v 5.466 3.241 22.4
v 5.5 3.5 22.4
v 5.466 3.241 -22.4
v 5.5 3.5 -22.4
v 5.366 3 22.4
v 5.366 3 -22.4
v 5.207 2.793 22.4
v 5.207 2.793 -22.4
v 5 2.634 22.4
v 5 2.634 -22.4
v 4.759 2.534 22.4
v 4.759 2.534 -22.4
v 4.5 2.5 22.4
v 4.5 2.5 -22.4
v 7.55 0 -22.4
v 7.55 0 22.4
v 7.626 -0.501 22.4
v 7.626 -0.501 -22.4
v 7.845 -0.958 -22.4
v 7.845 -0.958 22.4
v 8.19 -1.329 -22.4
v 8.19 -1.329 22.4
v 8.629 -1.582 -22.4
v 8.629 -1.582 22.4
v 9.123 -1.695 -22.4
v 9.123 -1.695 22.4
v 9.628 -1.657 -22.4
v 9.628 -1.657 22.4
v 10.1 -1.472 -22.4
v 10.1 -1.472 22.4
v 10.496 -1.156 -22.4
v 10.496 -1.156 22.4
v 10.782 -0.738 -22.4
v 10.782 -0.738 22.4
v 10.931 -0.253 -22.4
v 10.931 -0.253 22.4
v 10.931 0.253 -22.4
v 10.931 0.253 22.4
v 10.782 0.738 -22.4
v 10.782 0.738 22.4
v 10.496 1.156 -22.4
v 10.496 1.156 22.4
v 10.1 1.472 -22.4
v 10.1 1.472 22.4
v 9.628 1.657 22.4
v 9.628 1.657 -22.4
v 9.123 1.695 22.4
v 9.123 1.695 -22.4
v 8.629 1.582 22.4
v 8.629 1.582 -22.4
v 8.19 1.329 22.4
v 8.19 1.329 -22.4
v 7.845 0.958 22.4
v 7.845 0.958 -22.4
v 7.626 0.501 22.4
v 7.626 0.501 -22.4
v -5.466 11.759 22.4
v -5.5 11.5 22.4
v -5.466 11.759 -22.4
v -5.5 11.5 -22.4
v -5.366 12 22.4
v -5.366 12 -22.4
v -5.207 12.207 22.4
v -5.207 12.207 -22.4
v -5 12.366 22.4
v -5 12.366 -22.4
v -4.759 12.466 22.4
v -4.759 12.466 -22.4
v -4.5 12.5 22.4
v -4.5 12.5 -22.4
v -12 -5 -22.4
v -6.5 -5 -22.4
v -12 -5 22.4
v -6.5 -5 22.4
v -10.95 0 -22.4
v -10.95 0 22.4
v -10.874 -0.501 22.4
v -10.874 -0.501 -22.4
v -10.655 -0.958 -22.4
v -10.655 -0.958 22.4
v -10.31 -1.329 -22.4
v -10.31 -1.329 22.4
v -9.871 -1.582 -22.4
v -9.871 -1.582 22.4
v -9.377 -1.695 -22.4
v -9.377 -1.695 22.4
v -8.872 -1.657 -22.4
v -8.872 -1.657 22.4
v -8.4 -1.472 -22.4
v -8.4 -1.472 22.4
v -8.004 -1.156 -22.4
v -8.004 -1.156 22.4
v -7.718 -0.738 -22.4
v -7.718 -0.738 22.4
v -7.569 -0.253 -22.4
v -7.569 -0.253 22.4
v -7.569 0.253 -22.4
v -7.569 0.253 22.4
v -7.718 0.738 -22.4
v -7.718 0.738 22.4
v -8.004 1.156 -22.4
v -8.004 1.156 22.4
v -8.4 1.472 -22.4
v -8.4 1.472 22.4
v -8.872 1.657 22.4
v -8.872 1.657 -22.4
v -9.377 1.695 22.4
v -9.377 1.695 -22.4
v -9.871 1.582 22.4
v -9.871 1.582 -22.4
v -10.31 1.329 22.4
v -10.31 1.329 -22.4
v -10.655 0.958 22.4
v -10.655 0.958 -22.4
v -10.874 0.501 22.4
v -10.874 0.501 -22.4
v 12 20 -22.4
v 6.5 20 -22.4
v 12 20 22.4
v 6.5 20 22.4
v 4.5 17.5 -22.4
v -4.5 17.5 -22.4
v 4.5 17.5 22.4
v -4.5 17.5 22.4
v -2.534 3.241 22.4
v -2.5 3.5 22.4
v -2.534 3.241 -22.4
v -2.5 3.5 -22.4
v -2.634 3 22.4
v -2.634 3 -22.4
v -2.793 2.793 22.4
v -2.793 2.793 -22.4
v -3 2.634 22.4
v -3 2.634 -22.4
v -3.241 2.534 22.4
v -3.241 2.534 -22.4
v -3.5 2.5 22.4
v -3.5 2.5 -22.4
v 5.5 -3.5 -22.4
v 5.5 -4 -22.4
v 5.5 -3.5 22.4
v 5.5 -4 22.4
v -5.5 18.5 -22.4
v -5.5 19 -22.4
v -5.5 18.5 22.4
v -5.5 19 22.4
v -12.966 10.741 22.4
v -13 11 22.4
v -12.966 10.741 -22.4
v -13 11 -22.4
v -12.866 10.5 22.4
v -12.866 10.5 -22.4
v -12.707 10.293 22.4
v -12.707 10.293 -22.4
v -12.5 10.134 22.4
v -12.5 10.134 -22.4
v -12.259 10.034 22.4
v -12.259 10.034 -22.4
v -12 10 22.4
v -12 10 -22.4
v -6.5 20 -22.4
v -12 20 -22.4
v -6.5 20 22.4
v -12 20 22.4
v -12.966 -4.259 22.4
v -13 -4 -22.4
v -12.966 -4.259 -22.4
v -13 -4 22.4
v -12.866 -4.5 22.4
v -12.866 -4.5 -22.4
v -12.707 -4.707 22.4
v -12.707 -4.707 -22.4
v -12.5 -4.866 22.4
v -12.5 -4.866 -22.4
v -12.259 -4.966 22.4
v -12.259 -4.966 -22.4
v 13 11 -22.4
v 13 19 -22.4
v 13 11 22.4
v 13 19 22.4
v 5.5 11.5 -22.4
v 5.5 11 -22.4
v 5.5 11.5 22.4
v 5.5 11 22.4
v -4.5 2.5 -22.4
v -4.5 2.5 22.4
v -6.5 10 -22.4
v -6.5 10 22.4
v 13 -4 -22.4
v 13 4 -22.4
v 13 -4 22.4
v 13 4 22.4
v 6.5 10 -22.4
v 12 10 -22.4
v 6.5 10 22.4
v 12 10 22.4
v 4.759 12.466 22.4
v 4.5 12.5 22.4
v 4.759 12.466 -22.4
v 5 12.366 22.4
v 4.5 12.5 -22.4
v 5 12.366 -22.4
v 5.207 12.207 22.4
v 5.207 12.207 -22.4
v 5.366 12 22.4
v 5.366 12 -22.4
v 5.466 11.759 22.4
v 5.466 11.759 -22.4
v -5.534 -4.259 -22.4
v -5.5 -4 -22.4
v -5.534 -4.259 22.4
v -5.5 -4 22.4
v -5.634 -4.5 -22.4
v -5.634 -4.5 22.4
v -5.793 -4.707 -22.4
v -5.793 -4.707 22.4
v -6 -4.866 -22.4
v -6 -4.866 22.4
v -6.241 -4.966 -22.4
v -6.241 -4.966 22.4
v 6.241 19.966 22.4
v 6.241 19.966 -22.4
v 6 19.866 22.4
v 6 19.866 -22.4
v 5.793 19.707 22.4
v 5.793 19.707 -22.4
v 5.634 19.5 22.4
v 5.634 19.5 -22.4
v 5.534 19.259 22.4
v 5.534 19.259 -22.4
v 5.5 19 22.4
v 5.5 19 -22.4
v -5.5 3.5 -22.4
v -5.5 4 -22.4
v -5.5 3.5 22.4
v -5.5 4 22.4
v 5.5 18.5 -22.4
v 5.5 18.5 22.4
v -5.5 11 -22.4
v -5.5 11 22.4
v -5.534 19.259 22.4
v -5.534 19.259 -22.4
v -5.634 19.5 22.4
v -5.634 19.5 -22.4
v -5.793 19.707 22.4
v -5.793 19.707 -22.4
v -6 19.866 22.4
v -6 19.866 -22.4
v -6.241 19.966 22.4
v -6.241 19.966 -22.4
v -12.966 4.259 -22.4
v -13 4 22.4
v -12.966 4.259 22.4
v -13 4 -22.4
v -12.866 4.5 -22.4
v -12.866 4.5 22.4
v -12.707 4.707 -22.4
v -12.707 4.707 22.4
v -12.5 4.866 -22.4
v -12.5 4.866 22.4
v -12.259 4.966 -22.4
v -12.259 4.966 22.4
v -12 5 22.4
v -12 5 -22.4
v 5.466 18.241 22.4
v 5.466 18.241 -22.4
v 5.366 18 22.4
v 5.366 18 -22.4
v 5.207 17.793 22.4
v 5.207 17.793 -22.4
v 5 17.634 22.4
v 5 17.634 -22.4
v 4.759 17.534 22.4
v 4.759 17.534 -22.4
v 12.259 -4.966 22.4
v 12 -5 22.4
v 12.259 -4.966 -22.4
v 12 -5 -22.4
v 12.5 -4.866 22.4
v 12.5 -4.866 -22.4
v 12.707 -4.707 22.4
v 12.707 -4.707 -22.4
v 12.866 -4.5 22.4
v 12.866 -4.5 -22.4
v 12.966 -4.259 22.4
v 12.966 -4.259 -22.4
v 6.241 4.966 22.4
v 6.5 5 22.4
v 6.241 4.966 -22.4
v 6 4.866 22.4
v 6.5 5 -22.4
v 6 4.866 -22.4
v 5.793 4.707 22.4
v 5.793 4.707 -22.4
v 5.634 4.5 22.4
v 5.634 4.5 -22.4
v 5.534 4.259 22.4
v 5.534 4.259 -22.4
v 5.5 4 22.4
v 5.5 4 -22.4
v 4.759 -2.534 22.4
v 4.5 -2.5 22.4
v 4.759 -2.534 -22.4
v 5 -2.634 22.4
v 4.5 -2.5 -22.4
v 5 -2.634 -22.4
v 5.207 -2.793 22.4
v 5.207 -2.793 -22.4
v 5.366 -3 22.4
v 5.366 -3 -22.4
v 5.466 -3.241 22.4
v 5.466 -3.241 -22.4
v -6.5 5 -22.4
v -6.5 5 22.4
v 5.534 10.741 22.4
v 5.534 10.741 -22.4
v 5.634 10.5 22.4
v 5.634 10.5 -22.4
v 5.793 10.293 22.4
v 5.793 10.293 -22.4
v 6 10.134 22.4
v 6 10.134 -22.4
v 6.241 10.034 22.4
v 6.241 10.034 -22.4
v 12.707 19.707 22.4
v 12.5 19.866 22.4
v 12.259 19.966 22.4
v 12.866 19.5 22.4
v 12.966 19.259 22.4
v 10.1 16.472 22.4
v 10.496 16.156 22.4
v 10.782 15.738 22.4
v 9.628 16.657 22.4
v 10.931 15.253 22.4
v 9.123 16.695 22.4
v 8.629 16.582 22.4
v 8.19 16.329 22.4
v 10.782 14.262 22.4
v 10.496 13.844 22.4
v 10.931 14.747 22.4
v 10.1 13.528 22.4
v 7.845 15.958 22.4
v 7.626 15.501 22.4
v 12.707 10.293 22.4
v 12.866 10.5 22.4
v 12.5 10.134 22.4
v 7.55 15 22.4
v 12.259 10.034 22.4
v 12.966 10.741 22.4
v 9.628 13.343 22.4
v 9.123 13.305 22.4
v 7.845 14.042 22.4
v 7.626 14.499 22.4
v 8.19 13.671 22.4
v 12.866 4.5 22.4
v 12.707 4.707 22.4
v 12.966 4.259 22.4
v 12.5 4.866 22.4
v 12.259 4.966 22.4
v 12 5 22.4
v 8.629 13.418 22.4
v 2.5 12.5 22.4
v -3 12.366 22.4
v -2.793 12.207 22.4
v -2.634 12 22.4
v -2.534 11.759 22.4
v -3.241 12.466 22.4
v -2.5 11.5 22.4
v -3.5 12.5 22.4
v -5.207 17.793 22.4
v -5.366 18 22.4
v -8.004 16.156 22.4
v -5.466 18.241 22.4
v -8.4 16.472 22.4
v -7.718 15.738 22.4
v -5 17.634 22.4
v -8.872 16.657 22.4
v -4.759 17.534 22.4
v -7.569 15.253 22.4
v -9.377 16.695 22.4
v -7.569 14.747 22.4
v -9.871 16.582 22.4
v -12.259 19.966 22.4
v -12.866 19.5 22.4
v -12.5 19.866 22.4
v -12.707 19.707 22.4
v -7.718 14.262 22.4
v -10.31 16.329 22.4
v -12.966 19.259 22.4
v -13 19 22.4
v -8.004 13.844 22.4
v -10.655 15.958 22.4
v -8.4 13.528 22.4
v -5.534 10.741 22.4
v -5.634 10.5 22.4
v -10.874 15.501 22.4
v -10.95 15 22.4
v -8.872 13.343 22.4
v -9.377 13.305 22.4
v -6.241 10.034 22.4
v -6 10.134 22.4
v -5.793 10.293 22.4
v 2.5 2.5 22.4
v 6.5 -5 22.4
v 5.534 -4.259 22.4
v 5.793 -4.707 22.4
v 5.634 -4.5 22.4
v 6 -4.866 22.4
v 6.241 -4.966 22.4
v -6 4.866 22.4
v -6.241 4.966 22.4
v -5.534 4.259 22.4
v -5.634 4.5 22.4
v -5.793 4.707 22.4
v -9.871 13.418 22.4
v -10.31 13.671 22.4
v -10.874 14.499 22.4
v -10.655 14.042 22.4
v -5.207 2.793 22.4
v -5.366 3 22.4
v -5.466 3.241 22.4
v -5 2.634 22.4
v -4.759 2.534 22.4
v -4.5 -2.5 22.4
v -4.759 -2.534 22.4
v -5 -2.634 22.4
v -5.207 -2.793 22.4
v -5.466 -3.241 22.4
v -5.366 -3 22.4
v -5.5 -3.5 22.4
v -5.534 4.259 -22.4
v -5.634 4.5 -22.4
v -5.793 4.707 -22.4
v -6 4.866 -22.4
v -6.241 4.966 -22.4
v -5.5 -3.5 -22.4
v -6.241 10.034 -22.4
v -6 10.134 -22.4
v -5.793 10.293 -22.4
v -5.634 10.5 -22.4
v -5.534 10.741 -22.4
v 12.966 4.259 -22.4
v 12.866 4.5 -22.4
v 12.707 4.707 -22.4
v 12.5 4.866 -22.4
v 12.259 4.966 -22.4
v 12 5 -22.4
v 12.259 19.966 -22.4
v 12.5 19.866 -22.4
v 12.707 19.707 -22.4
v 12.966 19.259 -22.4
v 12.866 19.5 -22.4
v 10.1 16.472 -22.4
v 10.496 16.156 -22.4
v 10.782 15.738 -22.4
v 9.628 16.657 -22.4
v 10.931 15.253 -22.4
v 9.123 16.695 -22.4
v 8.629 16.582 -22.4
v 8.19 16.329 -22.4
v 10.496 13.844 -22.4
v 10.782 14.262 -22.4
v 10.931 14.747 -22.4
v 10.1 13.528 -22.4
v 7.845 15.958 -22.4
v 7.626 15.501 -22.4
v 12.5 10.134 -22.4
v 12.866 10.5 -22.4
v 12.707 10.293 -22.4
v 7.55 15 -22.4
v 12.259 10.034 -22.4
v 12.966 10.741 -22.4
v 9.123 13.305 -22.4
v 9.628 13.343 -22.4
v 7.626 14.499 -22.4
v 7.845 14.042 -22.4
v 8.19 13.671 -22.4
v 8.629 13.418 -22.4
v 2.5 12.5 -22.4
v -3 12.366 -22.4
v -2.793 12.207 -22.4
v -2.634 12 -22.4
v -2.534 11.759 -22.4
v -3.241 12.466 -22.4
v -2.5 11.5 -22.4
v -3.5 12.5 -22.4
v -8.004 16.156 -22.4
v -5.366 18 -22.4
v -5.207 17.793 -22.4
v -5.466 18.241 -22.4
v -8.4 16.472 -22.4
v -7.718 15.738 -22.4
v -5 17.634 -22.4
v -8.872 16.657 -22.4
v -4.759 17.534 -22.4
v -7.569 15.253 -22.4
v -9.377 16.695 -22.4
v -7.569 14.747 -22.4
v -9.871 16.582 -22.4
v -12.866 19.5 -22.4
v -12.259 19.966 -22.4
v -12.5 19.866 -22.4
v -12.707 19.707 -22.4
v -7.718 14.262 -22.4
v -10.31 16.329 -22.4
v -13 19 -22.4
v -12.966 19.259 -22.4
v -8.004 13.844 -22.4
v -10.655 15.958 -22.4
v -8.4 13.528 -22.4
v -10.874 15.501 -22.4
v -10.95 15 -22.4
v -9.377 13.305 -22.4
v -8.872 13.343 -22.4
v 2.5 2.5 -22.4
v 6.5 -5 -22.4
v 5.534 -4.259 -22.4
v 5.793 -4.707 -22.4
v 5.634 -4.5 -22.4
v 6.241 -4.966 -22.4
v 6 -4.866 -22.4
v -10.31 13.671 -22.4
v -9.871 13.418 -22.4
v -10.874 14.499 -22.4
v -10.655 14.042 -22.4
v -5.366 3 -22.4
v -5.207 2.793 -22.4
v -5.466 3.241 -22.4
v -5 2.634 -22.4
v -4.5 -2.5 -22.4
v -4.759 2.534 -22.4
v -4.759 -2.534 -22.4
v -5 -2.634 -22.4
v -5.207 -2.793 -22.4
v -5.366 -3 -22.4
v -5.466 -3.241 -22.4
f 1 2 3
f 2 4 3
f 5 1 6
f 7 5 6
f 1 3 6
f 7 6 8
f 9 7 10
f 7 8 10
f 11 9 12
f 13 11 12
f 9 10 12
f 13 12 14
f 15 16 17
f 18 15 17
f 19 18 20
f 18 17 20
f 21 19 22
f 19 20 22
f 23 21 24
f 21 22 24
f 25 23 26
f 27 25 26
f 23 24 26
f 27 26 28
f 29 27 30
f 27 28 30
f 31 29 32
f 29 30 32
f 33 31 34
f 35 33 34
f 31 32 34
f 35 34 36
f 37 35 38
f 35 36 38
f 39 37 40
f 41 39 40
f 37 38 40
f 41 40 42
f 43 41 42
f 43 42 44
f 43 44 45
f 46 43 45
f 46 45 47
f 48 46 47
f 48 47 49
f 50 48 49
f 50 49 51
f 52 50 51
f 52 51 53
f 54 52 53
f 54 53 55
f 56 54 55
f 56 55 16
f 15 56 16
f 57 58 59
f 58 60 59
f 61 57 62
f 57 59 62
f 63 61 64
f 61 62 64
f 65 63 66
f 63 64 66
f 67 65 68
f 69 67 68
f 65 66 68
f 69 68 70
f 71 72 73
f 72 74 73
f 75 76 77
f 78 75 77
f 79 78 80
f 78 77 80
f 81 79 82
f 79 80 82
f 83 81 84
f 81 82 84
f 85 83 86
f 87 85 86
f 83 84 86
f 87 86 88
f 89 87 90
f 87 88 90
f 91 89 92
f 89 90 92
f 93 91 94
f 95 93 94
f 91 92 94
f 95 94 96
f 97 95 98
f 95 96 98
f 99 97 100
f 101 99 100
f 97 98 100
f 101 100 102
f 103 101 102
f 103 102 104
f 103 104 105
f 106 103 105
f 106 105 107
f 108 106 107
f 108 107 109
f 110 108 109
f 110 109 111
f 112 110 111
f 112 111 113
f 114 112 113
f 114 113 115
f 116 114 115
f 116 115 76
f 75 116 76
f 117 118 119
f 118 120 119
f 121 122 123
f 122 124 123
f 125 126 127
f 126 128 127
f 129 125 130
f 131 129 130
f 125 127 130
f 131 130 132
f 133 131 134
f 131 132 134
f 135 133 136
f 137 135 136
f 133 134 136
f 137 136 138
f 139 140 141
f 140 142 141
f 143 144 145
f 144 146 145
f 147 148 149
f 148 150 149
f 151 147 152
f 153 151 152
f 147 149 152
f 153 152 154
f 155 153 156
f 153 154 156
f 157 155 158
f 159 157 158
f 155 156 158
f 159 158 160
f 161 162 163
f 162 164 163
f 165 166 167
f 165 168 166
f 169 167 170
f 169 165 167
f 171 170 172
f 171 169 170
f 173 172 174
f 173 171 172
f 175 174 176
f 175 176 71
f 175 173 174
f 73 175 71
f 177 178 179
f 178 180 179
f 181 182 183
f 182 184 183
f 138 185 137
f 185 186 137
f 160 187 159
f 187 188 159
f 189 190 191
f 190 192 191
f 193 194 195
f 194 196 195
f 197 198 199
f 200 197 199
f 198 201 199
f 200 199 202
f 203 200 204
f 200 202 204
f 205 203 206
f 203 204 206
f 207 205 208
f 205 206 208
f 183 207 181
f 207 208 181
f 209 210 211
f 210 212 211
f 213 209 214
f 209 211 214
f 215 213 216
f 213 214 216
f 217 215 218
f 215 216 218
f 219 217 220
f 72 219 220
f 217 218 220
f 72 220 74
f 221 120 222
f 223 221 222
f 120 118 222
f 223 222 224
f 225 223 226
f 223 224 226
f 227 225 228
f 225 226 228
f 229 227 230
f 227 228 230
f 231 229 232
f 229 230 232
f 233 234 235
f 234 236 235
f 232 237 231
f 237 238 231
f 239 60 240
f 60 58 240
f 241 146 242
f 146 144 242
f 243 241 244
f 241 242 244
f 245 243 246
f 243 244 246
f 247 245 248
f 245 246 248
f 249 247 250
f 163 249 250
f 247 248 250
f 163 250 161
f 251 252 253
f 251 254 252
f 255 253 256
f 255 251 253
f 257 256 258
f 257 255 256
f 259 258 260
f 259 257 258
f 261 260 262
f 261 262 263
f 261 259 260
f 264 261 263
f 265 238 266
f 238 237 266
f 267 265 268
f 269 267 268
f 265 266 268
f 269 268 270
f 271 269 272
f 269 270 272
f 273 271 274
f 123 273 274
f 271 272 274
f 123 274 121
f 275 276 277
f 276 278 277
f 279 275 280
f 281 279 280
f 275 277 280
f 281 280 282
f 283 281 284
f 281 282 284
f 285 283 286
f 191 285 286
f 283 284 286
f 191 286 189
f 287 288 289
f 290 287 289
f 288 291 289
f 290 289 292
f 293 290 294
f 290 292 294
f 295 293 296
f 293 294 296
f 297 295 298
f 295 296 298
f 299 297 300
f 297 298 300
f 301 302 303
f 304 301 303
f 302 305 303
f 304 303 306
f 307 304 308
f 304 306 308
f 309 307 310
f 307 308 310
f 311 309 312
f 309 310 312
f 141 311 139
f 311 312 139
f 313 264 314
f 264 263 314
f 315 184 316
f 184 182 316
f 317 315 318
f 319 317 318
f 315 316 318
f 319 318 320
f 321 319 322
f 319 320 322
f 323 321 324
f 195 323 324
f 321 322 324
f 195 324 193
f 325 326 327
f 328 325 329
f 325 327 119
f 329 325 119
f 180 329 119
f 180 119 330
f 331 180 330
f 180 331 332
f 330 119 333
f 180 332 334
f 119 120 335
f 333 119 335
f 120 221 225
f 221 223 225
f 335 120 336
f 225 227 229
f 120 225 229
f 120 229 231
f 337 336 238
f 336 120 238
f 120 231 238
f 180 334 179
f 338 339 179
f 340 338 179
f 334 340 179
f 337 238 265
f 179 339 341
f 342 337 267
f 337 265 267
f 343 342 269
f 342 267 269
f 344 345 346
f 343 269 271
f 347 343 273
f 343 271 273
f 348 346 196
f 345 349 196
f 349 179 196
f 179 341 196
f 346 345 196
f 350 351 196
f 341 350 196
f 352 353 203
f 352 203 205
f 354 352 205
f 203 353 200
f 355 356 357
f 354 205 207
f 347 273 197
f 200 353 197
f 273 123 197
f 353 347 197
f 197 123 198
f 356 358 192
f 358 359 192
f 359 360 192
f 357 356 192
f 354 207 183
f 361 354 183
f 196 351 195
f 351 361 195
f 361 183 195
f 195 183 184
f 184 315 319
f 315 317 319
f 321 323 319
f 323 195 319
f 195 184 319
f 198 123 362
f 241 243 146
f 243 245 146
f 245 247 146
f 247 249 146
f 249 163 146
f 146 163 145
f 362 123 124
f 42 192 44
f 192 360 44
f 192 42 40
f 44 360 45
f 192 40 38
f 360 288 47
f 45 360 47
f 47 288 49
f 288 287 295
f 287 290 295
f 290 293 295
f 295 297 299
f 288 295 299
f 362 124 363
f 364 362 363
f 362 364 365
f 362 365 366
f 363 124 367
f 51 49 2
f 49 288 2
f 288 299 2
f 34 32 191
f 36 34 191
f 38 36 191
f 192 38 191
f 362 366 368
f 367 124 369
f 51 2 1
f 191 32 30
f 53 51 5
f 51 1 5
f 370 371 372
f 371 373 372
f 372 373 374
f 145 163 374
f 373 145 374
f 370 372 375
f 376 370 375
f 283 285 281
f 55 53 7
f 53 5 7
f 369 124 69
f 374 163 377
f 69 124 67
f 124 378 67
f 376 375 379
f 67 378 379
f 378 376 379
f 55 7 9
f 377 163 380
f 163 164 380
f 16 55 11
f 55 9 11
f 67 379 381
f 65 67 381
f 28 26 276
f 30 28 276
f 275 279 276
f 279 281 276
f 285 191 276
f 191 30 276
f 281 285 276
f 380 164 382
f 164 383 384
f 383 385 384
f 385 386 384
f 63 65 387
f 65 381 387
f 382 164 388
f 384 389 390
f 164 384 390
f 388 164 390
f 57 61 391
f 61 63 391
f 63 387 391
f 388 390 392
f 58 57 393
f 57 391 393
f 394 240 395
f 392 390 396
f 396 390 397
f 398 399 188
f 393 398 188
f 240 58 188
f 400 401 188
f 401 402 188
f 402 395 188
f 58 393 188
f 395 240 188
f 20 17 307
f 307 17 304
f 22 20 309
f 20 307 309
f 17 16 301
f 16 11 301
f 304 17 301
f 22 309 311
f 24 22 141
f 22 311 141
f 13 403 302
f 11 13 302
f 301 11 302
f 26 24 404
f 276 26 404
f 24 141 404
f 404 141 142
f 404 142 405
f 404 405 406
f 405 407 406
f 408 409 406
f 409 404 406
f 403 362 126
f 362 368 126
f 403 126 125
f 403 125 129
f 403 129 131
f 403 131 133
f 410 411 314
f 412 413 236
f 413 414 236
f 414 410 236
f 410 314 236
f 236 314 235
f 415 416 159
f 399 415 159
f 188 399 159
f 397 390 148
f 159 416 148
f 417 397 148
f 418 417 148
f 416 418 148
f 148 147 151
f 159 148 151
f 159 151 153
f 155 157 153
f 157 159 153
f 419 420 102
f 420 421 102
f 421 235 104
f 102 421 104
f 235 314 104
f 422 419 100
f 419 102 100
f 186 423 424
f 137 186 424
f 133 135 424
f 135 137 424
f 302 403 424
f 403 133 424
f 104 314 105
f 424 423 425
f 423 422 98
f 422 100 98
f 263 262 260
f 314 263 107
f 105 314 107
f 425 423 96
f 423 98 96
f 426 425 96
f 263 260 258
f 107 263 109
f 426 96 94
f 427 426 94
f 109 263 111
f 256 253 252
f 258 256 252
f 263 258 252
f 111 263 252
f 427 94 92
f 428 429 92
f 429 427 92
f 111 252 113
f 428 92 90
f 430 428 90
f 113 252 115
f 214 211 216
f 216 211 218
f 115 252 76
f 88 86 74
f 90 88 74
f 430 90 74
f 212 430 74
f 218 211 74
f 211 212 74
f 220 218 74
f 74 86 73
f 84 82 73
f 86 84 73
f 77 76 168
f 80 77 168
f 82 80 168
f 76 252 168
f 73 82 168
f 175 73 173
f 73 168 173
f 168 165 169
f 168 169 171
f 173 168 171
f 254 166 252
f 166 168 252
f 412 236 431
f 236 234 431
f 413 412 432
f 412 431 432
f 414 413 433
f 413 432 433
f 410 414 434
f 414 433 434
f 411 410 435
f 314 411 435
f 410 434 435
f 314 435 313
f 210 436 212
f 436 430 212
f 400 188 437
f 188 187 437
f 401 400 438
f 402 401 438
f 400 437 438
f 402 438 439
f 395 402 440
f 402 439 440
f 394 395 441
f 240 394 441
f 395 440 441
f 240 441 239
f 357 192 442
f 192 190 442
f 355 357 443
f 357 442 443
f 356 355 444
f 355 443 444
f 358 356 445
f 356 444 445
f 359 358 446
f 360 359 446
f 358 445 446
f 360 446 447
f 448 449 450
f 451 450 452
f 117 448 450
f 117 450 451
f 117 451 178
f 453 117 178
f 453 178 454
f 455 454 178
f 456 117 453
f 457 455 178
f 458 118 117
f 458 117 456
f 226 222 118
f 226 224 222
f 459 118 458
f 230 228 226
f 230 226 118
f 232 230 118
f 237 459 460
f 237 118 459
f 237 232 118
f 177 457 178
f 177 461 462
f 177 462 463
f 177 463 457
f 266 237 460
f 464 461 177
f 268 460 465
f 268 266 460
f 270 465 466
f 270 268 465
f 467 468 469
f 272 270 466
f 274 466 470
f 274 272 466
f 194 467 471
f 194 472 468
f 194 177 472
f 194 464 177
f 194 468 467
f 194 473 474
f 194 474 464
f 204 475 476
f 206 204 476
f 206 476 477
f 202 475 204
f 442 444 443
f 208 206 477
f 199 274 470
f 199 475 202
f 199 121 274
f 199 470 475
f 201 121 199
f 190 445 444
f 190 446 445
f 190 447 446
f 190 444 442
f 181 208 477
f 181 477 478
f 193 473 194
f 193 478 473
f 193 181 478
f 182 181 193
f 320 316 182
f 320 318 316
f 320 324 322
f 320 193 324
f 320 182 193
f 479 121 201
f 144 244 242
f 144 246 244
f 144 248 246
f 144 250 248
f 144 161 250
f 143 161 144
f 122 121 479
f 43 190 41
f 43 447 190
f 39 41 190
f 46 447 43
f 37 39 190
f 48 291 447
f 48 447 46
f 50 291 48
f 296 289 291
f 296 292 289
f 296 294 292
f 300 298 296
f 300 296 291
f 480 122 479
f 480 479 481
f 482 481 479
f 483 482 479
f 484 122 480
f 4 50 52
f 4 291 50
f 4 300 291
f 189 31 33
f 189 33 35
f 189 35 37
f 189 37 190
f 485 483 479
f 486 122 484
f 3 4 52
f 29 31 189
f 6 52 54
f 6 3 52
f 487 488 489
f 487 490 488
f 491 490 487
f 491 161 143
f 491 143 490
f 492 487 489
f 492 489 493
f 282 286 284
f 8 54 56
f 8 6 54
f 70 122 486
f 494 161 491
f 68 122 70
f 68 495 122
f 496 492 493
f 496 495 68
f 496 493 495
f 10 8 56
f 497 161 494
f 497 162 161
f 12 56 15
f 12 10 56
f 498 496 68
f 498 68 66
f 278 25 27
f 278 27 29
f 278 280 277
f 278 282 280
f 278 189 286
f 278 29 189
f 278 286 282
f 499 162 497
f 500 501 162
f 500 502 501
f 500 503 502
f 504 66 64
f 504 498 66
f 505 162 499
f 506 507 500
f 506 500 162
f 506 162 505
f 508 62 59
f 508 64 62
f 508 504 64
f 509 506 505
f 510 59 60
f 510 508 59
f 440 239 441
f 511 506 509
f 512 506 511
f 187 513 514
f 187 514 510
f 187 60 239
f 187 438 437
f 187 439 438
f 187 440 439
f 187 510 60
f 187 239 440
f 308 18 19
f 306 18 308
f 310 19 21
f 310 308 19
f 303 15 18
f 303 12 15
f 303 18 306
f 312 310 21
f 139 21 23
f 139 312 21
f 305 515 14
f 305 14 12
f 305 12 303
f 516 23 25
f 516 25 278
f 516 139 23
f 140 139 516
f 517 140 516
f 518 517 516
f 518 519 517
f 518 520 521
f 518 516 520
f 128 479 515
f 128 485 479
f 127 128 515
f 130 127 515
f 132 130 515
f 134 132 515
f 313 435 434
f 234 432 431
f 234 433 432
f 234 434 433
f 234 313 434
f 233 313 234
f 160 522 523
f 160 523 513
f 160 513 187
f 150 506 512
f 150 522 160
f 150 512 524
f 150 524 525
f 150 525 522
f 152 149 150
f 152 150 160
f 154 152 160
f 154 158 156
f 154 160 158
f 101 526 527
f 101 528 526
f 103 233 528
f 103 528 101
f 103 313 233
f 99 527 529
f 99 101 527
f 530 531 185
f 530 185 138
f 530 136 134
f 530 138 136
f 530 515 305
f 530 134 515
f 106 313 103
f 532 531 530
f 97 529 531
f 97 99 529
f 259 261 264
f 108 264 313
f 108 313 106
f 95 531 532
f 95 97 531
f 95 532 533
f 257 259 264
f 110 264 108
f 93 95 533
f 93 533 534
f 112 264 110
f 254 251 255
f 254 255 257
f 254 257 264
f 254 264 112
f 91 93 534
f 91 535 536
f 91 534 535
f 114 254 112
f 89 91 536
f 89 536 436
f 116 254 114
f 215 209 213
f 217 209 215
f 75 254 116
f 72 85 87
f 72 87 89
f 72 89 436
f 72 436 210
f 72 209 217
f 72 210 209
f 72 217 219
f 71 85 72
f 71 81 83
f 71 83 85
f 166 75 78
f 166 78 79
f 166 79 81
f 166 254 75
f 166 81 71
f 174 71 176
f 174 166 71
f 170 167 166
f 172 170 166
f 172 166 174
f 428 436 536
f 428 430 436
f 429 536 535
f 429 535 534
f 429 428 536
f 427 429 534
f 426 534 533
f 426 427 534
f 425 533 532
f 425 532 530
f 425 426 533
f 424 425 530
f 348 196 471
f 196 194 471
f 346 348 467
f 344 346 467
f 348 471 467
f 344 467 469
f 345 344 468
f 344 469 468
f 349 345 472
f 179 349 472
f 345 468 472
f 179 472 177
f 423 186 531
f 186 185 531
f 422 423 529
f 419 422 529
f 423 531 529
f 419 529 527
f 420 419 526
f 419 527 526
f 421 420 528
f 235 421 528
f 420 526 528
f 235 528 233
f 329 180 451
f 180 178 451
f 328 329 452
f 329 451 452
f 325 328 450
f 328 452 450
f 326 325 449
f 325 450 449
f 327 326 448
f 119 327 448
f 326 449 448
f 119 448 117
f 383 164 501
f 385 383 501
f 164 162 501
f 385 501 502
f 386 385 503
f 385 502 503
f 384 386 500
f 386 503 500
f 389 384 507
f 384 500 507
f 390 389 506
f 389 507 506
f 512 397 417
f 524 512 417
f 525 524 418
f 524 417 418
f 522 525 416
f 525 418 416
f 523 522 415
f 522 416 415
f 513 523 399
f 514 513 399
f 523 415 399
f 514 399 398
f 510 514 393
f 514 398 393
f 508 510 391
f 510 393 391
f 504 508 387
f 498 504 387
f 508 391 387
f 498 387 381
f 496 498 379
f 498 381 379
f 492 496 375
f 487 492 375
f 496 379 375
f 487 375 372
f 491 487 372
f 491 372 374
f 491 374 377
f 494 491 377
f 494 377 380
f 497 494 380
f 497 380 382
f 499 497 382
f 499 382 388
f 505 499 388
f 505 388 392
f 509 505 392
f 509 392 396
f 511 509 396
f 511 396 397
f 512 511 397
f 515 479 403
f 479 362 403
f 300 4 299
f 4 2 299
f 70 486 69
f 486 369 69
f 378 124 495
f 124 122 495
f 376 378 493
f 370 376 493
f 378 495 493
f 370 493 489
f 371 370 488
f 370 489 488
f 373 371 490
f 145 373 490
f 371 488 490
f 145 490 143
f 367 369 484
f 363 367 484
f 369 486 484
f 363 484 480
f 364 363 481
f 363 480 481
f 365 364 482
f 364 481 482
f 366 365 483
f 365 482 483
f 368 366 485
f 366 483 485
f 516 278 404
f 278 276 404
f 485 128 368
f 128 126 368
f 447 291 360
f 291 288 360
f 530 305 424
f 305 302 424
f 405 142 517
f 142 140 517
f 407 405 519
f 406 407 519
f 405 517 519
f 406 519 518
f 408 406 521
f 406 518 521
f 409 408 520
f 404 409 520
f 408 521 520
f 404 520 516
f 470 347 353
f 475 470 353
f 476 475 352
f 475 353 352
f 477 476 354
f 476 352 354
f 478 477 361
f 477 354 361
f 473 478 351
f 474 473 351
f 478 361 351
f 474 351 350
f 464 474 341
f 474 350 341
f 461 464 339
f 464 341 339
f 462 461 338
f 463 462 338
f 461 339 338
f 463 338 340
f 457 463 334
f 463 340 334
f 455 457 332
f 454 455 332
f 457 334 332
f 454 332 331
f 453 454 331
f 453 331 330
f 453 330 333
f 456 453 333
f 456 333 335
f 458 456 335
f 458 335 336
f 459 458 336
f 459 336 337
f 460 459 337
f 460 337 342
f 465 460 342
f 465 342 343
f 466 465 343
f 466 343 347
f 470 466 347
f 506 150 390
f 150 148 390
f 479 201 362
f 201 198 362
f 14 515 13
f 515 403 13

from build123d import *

# Parameters (mm, degrees)
SALIENTE_EXTRUIR1_DEPTH      = 22.4
REDONDEO1_R                  = 1
TALADRO_DE_MARGEN_PARA_M31_D = 3.4


with BuildPart() as part:
    # Croquis1 → Saliente-Extruir1 (new, symmetric)
    with BuildSketch(Plane(origin=(0, 0, 0), x_dir=(0, 1, 0), z_dir=(0, 0, 1))):
        Polygon((-5, 13), (5, 13), (5, 5.5), (2.5, 5.5), (2.5, 2.5), (12.5, 2.5), (12.5, 5.5), (10, 5.5), (10, 13), (20, 13), (20, 5.5), (17.5, 5.5), (17.5, -5.5), (20, -5.5), (20, -13), (10, -13), (10, -5.5), (12.5, -5.5), (12.5, -2.5), (2.5, -2.5), (2.5, -5.5), (5, -5.5), (5, -13), (-5, -13), (-5, -5.5), (-2.5, -5.5), (-2.5, 5.5), (-5, 5.5), align=None)
    extrude(amount=SALIENTE_EXTRUIR1_DEPTH, both=True)

    # Redondeo1
    redondeo1_edges = [part.edges().sort_by_distance(p)[0] for p in [
        (-5.5, -5, 0),
        (-13, -5, 0),
        (-13, 5, 0),
        (-5.5, 5, 0),
        (-5.5, 2.5, 0),
        (-2.5, 2.5, 0),
        (-2.5, 12.5, 0),
        (-5.5, 12.5, 0),
        (-5.5, 10, 0),
        (-13, 10, 0),
        (-13, 20, 0),
        (-5.5, 20, 0),
        (-5.5, 17.5, 0),
        (5.5, 17.5, 0),
        (5.5, 20, 0),
        (13, 20, 0),
        (13, 10, 0),
        (5.5, 10, 0),
        (5.5, 12.5, 0),
        (5.5, 2.5, 0),
        (5.5, 5, 0),
        (13, 5, 0),
        (13, -5, 0),
        (5.5, -5, 0),
        (5.5, -2.5, 0),
        (-5.5, -2.5, 0),
    ]]
    fillet(redondeo1_edges, radius=REDONDEO1_R)

    # Taladro de margen para M31 (through all)
    with Locations(Plane(origin=(0, 0, -22.4), x_dir=(1, 0, 0), z_dir=(0, 0, -1))):
        with Locations((-9.25, -15), (-9.25, 0), (9.25, 0), (9.25, -15)):
            Hole(TALADRO_DE_MARGEN_PARA_M31_D / 2)


solid = part.part
